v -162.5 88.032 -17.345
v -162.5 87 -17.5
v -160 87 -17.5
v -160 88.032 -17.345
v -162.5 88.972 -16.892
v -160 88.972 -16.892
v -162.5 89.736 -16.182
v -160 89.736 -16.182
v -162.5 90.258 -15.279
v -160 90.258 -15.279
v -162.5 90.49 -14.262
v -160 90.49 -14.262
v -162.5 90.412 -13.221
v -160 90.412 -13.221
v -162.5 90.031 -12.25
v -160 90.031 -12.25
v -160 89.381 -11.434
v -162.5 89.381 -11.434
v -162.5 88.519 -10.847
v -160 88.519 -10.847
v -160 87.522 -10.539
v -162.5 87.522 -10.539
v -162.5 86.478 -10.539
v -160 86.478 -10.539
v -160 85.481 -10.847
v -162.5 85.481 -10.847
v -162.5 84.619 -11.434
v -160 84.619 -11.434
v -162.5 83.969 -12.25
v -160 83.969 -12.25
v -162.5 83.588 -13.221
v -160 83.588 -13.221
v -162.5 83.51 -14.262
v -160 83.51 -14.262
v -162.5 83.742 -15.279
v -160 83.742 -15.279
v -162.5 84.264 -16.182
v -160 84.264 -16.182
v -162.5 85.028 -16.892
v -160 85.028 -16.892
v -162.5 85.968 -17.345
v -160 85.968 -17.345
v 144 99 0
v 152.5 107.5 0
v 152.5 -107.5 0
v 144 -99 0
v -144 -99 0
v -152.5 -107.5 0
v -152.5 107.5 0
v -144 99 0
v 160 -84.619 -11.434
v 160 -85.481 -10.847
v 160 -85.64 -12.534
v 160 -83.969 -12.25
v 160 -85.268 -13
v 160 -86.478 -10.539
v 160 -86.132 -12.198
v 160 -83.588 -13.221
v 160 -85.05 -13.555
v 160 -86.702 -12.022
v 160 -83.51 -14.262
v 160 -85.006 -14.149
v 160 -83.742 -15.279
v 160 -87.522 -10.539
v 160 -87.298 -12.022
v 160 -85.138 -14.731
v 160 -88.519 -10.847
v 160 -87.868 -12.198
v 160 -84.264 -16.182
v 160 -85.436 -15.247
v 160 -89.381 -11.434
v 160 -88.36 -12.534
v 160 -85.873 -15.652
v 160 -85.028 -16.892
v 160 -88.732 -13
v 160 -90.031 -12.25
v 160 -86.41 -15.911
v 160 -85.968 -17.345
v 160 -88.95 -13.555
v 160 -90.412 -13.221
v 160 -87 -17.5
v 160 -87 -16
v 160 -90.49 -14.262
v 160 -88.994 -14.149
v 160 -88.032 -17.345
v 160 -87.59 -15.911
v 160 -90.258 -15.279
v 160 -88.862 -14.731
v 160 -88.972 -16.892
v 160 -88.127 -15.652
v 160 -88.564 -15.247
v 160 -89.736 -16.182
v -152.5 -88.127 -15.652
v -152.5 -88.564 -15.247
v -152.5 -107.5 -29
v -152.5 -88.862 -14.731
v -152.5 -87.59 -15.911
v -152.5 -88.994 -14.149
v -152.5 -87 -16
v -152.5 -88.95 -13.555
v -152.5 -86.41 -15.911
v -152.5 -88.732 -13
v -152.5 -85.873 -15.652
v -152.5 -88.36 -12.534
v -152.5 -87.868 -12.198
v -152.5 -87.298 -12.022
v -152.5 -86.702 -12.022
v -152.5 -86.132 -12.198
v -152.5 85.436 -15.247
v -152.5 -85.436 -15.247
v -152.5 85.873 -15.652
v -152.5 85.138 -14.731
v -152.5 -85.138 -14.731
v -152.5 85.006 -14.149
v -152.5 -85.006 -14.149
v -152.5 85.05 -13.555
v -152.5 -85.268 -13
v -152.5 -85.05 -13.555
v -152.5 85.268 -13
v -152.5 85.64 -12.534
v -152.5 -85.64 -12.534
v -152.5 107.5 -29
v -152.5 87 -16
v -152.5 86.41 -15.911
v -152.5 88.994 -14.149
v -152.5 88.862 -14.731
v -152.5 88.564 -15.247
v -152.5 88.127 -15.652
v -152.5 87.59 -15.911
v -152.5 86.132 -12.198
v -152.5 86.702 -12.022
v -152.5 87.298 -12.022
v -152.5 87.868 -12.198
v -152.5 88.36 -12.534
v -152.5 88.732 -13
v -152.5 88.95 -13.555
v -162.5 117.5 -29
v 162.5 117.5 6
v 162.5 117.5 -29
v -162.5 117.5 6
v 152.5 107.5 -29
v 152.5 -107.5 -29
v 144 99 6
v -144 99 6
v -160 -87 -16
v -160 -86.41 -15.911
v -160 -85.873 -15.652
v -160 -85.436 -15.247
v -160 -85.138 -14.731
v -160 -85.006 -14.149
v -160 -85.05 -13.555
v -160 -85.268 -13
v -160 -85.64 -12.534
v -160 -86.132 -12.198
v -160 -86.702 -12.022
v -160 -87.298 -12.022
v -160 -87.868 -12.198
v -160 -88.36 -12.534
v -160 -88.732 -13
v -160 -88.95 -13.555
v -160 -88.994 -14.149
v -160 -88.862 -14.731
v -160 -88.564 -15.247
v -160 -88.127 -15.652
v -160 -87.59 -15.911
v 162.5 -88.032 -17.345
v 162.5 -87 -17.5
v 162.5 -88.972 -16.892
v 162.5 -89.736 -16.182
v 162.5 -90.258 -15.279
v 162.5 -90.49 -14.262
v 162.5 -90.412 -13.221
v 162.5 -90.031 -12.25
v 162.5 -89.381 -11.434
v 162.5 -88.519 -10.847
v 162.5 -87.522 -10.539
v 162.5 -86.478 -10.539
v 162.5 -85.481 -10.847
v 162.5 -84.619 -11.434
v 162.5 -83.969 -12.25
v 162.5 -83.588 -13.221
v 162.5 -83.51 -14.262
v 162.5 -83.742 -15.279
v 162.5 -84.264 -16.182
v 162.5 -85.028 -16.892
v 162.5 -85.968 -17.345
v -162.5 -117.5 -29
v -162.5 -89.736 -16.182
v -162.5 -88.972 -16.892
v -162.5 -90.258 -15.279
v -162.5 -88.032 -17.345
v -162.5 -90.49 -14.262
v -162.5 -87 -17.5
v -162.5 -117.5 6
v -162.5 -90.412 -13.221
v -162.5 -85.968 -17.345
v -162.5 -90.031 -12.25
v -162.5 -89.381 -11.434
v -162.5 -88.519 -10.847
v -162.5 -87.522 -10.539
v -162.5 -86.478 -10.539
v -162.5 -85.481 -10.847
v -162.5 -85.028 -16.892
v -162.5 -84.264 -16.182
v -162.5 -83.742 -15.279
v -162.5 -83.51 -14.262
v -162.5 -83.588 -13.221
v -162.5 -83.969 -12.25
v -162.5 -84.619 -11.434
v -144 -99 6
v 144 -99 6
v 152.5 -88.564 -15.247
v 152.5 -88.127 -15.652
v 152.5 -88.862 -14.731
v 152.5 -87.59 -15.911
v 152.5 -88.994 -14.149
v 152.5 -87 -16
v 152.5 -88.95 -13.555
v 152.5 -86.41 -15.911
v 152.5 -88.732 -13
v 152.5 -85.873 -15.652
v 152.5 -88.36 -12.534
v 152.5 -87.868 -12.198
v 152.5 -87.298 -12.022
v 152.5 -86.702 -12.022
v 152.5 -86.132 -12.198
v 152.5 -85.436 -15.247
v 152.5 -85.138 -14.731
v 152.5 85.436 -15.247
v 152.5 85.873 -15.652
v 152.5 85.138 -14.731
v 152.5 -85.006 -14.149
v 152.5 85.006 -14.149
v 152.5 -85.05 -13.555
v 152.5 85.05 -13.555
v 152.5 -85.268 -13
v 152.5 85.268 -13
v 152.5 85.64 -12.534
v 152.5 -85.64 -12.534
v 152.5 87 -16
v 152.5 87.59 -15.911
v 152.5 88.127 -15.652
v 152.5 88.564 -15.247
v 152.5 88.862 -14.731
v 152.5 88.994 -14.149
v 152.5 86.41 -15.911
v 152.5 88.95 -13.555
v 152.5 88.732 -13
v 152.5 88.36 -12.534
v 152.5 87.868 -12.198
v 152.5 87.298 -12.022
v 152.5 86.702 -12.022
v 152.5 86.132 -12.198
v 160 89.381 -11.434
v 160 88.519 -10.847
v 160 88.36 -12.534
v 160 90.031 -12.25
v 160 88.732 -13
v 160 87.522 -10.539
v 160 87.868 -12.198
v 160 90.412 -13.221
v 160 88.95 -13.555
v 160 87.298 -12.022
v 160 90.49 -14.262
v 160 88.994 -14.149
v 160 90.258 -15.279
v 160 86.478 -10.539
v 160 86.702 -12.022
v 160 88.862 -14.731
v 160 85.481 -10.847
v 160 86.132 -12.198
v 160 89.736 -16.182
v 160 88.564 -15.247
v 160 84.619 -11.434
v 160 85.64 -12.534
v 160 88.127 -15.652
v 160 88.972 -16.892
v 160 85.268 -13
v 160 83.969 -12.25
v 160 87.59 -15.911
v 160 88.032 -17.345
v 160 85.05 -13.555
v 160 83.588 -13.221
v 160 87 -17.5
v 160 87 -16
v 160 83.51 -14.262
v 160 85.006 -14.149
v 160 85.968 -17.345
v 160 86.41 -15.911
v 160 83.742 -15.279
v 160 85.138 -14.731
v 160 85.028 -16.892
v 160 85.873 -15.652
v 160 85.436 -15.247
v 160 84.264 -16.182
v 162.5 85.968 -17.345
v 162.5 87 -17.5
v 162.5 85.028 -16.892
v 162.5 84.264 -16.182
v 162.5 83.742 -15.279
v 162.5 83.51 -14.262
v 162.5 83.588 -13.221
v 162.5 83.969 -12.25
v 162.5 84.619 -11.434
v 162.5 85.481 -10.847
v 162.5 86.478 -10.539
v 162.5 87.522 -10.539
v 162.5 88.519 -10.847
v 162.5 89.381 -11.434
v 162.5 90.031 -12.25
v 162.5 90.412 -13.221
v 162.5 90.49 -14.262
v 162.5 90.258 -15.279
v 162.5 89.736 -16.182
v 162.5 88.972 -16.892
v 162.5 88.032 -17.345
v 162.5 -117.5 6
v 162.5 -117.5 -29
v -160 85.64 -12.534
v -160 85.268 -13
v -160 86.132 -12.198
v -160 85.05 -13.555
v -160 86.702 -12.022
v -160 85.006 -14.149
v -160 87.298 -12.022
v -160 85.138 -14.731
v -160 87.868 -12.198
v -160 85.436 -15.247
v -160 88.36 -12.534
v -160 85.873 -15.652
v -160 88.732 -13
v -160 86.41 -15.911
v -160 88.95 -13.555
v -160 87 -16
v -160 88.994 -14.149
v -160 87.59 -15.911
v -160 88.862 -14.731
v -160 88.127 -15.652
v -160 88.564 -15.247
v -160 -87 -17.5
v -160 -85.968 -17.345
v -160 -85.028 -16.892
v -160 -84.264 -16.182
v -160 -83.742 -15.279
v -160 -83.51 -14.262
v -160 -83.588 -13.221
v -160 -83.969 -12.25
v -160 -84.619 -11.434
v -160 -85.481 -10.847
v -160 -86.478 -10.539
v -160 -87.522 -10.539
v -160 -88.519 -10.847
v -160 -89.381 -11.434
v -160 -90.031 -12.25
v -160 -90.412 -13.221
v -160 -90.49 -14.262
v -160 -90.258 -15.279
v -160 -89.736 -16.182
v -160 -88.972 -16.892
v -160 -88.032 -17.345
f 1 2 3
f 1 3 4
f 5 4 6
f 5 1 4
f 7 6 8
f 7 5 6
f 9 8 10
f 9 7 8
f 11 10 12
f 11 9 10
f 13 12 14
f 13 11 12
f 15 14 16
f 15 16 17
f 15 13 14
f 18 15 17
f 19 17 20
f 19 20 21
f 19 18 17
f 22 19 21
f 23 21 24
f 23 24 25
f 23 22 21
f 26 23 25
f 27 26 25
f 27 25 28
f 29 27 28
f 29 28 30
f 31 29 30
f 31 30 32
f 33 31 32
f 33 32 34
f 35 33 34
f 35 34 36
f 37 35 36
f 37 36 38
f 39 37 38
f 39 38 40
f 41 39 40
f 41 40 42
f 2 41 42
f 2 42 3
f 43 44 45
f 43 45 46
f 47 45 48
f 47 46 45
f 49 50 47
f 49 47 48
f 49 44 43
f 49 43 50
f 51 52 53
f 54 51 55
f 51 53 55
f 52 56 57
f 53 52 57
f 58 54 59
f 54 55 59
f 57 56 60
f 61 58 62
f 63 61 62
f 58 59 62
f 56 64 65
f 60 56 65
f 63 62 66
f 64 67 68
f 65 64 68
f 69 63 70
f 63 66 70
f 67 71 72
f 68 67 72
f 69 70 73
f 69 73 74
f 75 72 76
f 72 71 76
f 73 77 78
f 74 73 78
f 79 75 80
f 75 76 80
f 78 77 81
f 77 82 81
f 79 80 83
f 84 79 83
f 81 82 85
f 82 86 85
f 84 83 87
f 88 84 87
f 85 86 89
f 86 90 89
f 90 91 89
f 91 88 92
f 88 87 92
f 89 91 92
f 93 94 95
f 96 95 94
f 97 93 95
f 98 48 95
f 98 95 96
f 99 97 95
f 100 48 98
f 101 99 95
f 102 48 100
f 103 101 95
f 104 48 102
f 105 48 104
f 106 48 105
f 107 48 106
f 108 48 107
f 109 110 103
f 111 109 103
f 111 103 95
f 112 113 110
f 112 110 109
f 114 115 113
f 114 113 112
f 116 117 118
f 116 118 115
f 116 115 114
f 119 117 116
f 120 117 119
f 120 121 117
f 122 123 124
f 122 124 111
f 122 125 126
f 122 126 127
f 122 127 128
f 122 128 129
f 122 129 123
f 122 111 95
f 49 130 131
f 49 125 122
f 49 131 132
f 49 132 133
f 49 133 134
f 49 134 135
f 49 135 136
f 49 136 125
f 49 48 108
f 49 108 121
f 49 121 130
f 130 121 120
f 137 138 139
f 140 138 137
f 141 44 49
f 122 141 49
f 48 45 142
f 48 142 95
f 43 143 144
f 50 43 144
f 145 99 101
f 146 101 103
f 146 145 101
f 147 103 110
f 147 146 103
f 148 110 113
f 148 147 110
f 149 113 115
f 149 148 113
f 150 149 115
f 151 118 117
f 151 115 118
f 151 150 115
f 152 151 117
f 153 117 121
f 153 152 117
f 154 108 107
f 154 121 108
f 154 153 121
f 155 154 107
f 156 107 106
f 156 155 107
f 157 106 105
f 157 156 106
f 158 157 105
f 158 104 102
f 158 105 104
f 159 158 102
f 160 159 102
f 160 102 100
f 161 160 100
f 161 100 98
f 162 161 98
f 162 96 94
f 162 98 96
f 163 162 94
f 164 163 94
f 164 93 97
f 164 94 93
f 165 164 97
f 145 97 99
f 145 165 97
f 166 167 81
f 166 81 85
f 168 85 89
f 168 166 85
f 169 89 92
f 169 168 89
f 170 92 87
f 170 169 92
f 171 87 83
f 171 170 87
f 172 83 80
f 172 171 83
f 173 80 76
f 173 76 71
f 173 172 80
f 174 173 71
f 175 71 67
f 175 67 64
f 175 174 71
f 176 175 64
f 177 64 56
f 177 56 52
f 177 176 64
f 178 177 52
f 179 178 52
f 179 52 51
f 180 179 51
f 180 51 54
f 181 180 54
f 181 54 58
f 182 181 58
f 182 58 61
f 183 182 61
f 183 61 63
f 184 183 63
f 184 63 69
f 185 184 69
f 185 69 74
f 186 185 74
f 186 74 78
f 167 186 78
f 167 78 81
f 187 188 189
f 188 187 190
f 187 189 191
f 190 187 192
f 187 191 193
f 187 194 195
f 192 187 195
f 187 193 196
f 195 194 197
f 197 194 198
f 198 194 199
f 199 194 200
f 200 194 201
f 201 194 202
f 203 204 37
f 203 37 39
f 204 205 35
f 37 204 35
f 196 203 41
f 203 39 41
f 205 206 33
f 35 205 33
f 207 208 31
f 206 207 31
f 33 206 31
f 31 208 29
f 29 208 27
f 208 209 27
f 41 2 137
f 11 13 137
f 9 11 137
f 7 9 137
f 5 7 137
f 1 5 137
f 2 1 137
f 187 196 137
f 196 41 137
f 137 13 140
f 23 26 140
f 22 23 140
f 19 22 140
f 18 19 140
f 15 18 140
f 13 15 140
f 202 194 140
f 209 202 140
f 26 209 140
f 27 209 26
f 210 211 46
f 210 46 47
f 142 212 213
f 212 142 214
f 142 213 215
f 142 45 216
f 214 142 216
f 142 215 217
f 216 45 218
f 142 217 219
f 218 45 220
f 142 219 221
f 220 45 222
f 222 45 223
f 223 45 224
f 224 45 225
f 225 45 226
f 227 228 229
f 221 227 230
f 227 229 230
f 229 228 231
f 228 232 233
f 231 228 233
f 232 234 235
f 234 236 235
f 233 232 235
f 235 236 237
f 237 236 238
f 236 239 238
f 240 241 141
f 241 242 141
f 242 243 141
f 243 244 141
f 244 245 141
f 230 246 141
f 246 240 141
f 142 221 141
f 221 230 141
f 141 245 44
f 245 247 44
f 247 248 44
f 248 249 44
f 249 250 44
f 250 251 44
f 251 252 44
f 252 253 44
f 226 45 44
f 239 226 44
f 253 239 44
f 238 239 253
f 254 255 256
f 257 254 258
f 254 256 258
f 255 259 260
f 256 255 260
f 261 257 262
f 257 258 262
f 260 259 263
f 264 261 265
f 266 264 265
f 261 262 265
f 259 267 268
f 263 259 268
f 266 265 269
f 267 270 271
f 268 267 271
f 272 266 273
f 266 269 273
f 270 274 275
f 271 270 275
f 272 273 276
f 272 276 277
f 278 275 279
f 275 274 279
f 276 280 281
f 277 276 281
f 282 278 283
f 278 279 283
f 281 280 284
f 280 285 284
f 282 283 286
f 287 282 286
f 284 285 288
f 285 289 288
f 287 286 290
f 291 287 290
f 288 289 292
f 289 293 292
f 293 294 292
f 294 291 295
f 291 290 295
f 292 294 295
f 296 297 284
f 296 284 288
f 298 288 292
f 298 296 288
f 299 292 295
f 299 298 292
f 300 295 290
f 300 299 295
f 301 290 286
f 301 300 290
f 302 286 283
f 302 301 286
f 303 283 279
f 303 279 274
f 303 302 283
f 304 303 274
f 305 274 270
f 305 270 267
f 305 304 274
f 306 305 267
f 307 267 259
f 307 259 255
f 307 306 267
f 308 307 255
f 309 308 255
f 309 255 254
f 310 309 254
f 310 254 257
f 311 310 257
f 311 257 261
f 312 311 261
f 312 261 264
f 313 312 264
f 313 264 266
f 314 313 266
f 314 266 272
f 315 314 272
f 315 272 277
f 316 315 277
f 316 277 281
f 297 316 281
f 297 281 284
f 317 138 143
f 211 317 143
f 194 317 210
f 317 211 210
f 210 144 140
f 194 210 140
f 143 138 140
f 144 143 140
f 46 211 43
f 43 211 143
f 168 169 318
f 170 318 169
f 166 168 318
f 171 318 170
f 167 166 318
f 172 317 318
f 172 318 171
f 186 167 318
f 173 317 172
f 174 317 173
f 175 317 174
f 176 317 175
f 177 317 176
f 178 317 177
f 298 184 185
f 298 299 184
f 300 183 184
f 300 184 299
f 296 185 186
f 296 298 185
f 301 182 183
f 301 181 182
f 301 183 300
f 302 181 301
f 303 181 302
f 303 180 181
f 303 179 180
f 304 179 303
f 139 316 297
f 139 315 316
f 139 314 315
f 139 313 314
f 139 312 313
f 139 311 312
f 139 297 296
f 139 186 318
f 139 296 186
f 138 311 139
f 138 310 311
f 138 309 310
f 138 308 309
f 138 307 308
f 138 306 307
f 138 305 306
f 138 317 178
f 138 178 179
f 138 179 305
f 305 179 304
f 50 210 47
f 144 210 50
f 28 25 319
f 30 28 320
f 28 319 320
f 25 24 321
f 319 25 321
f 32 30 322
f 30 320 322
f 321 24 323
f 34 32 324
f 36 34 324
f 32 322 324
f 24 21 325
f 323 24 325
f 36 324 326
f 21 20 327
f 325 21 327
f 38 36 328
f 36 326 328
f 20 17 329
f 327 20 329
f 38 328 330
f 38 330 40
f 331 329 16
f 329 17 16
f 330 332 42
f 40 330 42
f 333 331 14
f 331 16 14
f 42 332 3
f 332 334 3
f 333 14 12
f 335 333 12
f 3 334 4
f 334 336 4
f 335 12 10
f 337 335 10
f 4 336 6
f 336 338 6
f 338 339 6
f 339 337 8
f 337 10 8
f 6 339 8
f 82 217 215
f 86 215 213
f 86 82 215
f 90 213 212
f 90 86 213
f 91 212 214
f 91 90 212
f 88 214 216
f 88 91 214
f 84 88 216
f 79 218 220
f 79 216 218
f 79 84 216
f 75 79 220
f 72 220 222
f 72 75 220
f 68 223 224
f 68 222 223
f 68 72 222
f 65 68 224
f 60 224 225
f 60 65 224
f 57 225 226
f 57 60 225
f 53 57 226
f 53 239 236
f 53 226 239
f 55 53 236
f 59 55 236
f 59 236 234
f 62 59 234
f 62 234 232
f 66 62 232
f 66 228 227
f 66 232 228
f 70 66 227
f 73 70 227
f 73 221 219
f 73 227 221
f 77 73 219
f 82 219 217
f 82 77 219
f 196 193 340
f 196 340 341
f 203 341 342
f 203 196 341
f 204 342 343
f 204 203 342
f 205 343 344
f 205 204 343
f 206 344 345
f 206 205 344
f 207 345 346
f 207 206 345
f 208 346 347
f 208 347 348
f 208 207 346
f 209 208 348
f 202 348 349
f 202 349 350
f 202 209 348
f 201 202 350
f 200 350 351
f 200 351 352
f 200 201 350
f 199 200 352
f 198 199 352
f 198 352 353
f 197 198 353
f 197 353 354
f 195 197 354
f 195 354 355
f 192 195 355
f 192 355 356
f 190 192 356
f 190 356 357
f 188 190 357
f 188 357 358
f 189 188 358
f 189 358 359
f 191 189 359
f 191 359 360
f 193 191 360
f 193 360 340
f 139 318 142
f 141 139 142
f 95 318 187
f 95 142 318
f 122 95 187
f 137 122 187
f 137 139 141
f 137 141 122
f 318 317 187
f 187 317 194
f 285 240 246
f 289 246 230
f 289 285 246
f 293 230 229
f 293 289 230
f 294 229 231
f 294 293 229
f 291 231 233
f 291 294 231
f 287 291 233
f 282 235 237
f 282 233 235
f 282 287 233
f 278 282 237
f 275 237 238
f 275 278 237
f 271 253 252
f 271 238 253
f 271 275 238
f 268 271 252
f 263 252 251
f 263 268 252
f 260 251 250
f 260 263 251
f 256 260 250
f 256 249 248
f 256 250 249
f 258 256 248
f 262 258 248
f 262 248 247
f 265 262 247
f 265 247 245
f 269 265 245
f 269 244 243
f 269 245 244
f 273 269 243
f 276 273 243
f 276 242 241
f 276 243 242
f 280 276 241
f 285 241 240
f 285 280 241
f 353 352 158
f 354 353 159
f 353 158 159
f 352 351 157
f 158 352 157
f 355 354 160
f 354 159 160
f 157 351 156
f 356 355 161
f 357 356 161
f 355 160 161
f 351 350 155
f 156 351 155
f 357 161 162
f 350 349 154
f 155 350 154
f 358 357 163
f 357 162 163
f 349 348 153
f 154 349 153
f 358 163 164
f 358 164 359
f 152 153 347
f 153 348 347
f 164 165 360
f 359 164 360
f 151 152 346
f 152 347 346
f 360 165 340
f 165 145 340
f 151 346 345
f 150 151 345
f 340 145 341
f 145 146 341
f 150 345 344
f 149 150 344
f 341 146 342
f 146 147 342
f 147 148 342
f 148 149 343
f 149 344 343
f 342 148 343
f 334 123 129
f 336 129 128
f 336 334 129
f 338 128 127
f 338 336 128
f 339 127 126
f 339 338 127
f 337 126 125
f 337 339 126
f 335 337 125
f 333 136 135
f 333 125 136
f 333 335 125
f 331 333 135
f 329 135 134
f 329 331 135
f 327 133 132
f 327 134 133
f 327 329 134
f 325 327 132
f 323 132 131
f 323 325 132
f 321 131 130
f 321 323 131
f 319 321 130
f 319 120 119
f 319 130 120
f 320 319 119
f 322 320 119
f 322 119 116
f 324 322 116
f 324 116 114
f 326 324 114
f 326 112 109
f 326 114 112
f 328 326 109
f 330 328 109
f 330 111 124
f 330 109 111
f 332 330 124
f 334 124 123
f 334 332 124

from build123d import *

# Parameters (mm, degrees)
CYLINDER025_R             = 3.5
CYLINDER025_DEPTH         = 3
CYLINDER025_PITCH_ANGLE   = 90
CYLINDER024_R             = 2
CYLINDER024_DEPTH         = 9
CYLINDER024_PITCH_ANGLE   = 90
ARRAY021_COUNT            = 2
ARRAY022_Y_COUNT          = 2
ARRAY022_Y_PITCH          = 174
BOX001_W                  = 305
BOX001_H                  = 215
BOX001_DEPTH              = 29
BOX_W                     = 325
BOX_H                     = 235
BOX_DEPTH                 = 29
BOX003_W                  = 288
BOX003_H                  = 198
BOX003_DEPTH              = 6
BOX002_W                  = 325
BOX002_H                  = 235
BOX002_DEPTH              = 6
FUSION017_PLACEMENT_ANGLE = 180


with BuildPart() as case_2_frame_cut002:
    # Cylinder025 → Cylinder025 (new body)
    with BuildSketch(Plane.XY):
        Circle(CYLINDER025_R)
    extrude(amount=CYLINDER025_DEPTH)


with BuildPart() as case_2_frame_cut002_1:
    # Cylinder025 pitch: moved
    add(case_2_frame_cut002.part.rotate(Axis((0, 0, 0), (0, 1, 0)), CYLINDER025_PITCH_ANGLE))


with BuildPart() as case_2_frame_cut002_2:
    # Cylinder025 placement: moved
    add(case_2_frame_cut002_1.part)


with BuildPart() as array022:
    # Cylinder024 → Cylinder024 (new body)
    with BuildSketch(Plane.XY):
        Circle(CYLINDER024_R)
    extrude(amount=CYLINDER024_DEPTH)


with BuildPart() as array022_1:
    # Cylinder024 pitch: moved
    add(array022.part.rotate(Axis((0, 0, 0), (0, 1, 0)), CYLINDER024_PITCH_ANGLE))


with BuildPart() as array022_2:
    # Cylinder024 placement: moved
    add(array022_1.part.moved(Location((3, 0, 0))))

    # Fusion: union CASE_2_frame_cut002
    add(case_2_frame_cut002_2.part)


with BuildPart() as array022_3:
    # Fusion placement: moved
    add(array022_2.part.moved(Location((-163, 87, -14))))

    # Array021: Array022 ×2 about axis
    array021_axis = Axis((0, 87, 0), (0, 0, 1))


with BuildPart() as array022_4:
    add(array022_3.part)
    for i in range(1, ARRAY021_COUNT):
        add(array022_3.part.rotate(array021_axis, i * 360 / ARRAY021_COUNT))

    # Array022 Y: Array022 ×2


with BuildPart() as array022_5:
    add(array022_4.part)
    with Locations(*[(0, -i * ARRAY022_Y_PITCH, 0) for i in range(1, ARRAY022_Y_COUNT)]):
        add(array022_4.part)


with BuildPart() as case_2_frame_li:
    # Box001 → Box001 (new body)
    with BuildSketch(Plane(origin=(-152.5, -107.5, 0), x_dir=(1, 0, 0), z_dir=(0, 0, 1))):
        with Locations((152.5, 107.5)):
            Rectangle(BOX001_W, BOX001_H)
    extrude(amount=BOX001_DEPTH)


with BuildPart() as case_2_frame_l:
    # Box → Box (new body)
    with BuildSketch(Plane(origin=(-162.5, -117.5, 0), x_dir=(1, 0, 0), z_dir=(0, 0, 1))):
        with Locations((162.5, 117.5)):
            Rectangle(BOX_W, BOX_H)
    extrude(amount=BOX_DEPTH)

    # Cut004: cut CASE_2_frame_li
    add(case_2_frame_li.part, mode=Mode.SUBTRACT)


with BuildPart() as case_2_frame_ui:
    # Box003 → Box003 (new body)
    with BuildSketch(Plane(origin=(-144, -99, 0), x_dir=(1, 0, 0), z_dir=(0, 0, 1))):
        with Locations((144, 99)):
            Rectangle(BOX003_W, BOX003_H)
    extrude(amount=BOX003_DEPTH)


with BuildPart() as case_2_frame_front001:
    # Box002 → Box002 (new body)
    with BuildSketch(Plane(origin=(-162.5, -117.5, 0), x_dir=(1, 0, 0), z_dir=(0, 0, 1))):
        with Locations((162.5, 117.5)):
            Rectangle(BOX002_W, BOX002_H)
    extrude(amount=BOX002_DEPTH)

    # Cut003: cut CASE_2_frame_ui
    add(case_2_frame_ui.part, mode=Mode.SUBTRACT)


with BuildPart() as case_2_frame_front001_1:
    # Cut003 placement: moved
    add(case_2_frame_front001.part.moved(Location((0, 0, -6))))

    # Fusion017: union CASE_2_frame_l
    add(case_2_frame_l.part)


with BuildPart() as case_2_frame_front001_2:
    # Fusion017 placement: moved
    add(case_2_frame_front001_1.part.rotate(Axis((0, 0, 0), (0, 1, 0)), FUSION017_PLACEMENT_ANGLE))

    # Cut: cut Array022
    add(array022_5.part, mode=Mode.SUBTRACT)


solid = case_2_frame_front001_2.part
